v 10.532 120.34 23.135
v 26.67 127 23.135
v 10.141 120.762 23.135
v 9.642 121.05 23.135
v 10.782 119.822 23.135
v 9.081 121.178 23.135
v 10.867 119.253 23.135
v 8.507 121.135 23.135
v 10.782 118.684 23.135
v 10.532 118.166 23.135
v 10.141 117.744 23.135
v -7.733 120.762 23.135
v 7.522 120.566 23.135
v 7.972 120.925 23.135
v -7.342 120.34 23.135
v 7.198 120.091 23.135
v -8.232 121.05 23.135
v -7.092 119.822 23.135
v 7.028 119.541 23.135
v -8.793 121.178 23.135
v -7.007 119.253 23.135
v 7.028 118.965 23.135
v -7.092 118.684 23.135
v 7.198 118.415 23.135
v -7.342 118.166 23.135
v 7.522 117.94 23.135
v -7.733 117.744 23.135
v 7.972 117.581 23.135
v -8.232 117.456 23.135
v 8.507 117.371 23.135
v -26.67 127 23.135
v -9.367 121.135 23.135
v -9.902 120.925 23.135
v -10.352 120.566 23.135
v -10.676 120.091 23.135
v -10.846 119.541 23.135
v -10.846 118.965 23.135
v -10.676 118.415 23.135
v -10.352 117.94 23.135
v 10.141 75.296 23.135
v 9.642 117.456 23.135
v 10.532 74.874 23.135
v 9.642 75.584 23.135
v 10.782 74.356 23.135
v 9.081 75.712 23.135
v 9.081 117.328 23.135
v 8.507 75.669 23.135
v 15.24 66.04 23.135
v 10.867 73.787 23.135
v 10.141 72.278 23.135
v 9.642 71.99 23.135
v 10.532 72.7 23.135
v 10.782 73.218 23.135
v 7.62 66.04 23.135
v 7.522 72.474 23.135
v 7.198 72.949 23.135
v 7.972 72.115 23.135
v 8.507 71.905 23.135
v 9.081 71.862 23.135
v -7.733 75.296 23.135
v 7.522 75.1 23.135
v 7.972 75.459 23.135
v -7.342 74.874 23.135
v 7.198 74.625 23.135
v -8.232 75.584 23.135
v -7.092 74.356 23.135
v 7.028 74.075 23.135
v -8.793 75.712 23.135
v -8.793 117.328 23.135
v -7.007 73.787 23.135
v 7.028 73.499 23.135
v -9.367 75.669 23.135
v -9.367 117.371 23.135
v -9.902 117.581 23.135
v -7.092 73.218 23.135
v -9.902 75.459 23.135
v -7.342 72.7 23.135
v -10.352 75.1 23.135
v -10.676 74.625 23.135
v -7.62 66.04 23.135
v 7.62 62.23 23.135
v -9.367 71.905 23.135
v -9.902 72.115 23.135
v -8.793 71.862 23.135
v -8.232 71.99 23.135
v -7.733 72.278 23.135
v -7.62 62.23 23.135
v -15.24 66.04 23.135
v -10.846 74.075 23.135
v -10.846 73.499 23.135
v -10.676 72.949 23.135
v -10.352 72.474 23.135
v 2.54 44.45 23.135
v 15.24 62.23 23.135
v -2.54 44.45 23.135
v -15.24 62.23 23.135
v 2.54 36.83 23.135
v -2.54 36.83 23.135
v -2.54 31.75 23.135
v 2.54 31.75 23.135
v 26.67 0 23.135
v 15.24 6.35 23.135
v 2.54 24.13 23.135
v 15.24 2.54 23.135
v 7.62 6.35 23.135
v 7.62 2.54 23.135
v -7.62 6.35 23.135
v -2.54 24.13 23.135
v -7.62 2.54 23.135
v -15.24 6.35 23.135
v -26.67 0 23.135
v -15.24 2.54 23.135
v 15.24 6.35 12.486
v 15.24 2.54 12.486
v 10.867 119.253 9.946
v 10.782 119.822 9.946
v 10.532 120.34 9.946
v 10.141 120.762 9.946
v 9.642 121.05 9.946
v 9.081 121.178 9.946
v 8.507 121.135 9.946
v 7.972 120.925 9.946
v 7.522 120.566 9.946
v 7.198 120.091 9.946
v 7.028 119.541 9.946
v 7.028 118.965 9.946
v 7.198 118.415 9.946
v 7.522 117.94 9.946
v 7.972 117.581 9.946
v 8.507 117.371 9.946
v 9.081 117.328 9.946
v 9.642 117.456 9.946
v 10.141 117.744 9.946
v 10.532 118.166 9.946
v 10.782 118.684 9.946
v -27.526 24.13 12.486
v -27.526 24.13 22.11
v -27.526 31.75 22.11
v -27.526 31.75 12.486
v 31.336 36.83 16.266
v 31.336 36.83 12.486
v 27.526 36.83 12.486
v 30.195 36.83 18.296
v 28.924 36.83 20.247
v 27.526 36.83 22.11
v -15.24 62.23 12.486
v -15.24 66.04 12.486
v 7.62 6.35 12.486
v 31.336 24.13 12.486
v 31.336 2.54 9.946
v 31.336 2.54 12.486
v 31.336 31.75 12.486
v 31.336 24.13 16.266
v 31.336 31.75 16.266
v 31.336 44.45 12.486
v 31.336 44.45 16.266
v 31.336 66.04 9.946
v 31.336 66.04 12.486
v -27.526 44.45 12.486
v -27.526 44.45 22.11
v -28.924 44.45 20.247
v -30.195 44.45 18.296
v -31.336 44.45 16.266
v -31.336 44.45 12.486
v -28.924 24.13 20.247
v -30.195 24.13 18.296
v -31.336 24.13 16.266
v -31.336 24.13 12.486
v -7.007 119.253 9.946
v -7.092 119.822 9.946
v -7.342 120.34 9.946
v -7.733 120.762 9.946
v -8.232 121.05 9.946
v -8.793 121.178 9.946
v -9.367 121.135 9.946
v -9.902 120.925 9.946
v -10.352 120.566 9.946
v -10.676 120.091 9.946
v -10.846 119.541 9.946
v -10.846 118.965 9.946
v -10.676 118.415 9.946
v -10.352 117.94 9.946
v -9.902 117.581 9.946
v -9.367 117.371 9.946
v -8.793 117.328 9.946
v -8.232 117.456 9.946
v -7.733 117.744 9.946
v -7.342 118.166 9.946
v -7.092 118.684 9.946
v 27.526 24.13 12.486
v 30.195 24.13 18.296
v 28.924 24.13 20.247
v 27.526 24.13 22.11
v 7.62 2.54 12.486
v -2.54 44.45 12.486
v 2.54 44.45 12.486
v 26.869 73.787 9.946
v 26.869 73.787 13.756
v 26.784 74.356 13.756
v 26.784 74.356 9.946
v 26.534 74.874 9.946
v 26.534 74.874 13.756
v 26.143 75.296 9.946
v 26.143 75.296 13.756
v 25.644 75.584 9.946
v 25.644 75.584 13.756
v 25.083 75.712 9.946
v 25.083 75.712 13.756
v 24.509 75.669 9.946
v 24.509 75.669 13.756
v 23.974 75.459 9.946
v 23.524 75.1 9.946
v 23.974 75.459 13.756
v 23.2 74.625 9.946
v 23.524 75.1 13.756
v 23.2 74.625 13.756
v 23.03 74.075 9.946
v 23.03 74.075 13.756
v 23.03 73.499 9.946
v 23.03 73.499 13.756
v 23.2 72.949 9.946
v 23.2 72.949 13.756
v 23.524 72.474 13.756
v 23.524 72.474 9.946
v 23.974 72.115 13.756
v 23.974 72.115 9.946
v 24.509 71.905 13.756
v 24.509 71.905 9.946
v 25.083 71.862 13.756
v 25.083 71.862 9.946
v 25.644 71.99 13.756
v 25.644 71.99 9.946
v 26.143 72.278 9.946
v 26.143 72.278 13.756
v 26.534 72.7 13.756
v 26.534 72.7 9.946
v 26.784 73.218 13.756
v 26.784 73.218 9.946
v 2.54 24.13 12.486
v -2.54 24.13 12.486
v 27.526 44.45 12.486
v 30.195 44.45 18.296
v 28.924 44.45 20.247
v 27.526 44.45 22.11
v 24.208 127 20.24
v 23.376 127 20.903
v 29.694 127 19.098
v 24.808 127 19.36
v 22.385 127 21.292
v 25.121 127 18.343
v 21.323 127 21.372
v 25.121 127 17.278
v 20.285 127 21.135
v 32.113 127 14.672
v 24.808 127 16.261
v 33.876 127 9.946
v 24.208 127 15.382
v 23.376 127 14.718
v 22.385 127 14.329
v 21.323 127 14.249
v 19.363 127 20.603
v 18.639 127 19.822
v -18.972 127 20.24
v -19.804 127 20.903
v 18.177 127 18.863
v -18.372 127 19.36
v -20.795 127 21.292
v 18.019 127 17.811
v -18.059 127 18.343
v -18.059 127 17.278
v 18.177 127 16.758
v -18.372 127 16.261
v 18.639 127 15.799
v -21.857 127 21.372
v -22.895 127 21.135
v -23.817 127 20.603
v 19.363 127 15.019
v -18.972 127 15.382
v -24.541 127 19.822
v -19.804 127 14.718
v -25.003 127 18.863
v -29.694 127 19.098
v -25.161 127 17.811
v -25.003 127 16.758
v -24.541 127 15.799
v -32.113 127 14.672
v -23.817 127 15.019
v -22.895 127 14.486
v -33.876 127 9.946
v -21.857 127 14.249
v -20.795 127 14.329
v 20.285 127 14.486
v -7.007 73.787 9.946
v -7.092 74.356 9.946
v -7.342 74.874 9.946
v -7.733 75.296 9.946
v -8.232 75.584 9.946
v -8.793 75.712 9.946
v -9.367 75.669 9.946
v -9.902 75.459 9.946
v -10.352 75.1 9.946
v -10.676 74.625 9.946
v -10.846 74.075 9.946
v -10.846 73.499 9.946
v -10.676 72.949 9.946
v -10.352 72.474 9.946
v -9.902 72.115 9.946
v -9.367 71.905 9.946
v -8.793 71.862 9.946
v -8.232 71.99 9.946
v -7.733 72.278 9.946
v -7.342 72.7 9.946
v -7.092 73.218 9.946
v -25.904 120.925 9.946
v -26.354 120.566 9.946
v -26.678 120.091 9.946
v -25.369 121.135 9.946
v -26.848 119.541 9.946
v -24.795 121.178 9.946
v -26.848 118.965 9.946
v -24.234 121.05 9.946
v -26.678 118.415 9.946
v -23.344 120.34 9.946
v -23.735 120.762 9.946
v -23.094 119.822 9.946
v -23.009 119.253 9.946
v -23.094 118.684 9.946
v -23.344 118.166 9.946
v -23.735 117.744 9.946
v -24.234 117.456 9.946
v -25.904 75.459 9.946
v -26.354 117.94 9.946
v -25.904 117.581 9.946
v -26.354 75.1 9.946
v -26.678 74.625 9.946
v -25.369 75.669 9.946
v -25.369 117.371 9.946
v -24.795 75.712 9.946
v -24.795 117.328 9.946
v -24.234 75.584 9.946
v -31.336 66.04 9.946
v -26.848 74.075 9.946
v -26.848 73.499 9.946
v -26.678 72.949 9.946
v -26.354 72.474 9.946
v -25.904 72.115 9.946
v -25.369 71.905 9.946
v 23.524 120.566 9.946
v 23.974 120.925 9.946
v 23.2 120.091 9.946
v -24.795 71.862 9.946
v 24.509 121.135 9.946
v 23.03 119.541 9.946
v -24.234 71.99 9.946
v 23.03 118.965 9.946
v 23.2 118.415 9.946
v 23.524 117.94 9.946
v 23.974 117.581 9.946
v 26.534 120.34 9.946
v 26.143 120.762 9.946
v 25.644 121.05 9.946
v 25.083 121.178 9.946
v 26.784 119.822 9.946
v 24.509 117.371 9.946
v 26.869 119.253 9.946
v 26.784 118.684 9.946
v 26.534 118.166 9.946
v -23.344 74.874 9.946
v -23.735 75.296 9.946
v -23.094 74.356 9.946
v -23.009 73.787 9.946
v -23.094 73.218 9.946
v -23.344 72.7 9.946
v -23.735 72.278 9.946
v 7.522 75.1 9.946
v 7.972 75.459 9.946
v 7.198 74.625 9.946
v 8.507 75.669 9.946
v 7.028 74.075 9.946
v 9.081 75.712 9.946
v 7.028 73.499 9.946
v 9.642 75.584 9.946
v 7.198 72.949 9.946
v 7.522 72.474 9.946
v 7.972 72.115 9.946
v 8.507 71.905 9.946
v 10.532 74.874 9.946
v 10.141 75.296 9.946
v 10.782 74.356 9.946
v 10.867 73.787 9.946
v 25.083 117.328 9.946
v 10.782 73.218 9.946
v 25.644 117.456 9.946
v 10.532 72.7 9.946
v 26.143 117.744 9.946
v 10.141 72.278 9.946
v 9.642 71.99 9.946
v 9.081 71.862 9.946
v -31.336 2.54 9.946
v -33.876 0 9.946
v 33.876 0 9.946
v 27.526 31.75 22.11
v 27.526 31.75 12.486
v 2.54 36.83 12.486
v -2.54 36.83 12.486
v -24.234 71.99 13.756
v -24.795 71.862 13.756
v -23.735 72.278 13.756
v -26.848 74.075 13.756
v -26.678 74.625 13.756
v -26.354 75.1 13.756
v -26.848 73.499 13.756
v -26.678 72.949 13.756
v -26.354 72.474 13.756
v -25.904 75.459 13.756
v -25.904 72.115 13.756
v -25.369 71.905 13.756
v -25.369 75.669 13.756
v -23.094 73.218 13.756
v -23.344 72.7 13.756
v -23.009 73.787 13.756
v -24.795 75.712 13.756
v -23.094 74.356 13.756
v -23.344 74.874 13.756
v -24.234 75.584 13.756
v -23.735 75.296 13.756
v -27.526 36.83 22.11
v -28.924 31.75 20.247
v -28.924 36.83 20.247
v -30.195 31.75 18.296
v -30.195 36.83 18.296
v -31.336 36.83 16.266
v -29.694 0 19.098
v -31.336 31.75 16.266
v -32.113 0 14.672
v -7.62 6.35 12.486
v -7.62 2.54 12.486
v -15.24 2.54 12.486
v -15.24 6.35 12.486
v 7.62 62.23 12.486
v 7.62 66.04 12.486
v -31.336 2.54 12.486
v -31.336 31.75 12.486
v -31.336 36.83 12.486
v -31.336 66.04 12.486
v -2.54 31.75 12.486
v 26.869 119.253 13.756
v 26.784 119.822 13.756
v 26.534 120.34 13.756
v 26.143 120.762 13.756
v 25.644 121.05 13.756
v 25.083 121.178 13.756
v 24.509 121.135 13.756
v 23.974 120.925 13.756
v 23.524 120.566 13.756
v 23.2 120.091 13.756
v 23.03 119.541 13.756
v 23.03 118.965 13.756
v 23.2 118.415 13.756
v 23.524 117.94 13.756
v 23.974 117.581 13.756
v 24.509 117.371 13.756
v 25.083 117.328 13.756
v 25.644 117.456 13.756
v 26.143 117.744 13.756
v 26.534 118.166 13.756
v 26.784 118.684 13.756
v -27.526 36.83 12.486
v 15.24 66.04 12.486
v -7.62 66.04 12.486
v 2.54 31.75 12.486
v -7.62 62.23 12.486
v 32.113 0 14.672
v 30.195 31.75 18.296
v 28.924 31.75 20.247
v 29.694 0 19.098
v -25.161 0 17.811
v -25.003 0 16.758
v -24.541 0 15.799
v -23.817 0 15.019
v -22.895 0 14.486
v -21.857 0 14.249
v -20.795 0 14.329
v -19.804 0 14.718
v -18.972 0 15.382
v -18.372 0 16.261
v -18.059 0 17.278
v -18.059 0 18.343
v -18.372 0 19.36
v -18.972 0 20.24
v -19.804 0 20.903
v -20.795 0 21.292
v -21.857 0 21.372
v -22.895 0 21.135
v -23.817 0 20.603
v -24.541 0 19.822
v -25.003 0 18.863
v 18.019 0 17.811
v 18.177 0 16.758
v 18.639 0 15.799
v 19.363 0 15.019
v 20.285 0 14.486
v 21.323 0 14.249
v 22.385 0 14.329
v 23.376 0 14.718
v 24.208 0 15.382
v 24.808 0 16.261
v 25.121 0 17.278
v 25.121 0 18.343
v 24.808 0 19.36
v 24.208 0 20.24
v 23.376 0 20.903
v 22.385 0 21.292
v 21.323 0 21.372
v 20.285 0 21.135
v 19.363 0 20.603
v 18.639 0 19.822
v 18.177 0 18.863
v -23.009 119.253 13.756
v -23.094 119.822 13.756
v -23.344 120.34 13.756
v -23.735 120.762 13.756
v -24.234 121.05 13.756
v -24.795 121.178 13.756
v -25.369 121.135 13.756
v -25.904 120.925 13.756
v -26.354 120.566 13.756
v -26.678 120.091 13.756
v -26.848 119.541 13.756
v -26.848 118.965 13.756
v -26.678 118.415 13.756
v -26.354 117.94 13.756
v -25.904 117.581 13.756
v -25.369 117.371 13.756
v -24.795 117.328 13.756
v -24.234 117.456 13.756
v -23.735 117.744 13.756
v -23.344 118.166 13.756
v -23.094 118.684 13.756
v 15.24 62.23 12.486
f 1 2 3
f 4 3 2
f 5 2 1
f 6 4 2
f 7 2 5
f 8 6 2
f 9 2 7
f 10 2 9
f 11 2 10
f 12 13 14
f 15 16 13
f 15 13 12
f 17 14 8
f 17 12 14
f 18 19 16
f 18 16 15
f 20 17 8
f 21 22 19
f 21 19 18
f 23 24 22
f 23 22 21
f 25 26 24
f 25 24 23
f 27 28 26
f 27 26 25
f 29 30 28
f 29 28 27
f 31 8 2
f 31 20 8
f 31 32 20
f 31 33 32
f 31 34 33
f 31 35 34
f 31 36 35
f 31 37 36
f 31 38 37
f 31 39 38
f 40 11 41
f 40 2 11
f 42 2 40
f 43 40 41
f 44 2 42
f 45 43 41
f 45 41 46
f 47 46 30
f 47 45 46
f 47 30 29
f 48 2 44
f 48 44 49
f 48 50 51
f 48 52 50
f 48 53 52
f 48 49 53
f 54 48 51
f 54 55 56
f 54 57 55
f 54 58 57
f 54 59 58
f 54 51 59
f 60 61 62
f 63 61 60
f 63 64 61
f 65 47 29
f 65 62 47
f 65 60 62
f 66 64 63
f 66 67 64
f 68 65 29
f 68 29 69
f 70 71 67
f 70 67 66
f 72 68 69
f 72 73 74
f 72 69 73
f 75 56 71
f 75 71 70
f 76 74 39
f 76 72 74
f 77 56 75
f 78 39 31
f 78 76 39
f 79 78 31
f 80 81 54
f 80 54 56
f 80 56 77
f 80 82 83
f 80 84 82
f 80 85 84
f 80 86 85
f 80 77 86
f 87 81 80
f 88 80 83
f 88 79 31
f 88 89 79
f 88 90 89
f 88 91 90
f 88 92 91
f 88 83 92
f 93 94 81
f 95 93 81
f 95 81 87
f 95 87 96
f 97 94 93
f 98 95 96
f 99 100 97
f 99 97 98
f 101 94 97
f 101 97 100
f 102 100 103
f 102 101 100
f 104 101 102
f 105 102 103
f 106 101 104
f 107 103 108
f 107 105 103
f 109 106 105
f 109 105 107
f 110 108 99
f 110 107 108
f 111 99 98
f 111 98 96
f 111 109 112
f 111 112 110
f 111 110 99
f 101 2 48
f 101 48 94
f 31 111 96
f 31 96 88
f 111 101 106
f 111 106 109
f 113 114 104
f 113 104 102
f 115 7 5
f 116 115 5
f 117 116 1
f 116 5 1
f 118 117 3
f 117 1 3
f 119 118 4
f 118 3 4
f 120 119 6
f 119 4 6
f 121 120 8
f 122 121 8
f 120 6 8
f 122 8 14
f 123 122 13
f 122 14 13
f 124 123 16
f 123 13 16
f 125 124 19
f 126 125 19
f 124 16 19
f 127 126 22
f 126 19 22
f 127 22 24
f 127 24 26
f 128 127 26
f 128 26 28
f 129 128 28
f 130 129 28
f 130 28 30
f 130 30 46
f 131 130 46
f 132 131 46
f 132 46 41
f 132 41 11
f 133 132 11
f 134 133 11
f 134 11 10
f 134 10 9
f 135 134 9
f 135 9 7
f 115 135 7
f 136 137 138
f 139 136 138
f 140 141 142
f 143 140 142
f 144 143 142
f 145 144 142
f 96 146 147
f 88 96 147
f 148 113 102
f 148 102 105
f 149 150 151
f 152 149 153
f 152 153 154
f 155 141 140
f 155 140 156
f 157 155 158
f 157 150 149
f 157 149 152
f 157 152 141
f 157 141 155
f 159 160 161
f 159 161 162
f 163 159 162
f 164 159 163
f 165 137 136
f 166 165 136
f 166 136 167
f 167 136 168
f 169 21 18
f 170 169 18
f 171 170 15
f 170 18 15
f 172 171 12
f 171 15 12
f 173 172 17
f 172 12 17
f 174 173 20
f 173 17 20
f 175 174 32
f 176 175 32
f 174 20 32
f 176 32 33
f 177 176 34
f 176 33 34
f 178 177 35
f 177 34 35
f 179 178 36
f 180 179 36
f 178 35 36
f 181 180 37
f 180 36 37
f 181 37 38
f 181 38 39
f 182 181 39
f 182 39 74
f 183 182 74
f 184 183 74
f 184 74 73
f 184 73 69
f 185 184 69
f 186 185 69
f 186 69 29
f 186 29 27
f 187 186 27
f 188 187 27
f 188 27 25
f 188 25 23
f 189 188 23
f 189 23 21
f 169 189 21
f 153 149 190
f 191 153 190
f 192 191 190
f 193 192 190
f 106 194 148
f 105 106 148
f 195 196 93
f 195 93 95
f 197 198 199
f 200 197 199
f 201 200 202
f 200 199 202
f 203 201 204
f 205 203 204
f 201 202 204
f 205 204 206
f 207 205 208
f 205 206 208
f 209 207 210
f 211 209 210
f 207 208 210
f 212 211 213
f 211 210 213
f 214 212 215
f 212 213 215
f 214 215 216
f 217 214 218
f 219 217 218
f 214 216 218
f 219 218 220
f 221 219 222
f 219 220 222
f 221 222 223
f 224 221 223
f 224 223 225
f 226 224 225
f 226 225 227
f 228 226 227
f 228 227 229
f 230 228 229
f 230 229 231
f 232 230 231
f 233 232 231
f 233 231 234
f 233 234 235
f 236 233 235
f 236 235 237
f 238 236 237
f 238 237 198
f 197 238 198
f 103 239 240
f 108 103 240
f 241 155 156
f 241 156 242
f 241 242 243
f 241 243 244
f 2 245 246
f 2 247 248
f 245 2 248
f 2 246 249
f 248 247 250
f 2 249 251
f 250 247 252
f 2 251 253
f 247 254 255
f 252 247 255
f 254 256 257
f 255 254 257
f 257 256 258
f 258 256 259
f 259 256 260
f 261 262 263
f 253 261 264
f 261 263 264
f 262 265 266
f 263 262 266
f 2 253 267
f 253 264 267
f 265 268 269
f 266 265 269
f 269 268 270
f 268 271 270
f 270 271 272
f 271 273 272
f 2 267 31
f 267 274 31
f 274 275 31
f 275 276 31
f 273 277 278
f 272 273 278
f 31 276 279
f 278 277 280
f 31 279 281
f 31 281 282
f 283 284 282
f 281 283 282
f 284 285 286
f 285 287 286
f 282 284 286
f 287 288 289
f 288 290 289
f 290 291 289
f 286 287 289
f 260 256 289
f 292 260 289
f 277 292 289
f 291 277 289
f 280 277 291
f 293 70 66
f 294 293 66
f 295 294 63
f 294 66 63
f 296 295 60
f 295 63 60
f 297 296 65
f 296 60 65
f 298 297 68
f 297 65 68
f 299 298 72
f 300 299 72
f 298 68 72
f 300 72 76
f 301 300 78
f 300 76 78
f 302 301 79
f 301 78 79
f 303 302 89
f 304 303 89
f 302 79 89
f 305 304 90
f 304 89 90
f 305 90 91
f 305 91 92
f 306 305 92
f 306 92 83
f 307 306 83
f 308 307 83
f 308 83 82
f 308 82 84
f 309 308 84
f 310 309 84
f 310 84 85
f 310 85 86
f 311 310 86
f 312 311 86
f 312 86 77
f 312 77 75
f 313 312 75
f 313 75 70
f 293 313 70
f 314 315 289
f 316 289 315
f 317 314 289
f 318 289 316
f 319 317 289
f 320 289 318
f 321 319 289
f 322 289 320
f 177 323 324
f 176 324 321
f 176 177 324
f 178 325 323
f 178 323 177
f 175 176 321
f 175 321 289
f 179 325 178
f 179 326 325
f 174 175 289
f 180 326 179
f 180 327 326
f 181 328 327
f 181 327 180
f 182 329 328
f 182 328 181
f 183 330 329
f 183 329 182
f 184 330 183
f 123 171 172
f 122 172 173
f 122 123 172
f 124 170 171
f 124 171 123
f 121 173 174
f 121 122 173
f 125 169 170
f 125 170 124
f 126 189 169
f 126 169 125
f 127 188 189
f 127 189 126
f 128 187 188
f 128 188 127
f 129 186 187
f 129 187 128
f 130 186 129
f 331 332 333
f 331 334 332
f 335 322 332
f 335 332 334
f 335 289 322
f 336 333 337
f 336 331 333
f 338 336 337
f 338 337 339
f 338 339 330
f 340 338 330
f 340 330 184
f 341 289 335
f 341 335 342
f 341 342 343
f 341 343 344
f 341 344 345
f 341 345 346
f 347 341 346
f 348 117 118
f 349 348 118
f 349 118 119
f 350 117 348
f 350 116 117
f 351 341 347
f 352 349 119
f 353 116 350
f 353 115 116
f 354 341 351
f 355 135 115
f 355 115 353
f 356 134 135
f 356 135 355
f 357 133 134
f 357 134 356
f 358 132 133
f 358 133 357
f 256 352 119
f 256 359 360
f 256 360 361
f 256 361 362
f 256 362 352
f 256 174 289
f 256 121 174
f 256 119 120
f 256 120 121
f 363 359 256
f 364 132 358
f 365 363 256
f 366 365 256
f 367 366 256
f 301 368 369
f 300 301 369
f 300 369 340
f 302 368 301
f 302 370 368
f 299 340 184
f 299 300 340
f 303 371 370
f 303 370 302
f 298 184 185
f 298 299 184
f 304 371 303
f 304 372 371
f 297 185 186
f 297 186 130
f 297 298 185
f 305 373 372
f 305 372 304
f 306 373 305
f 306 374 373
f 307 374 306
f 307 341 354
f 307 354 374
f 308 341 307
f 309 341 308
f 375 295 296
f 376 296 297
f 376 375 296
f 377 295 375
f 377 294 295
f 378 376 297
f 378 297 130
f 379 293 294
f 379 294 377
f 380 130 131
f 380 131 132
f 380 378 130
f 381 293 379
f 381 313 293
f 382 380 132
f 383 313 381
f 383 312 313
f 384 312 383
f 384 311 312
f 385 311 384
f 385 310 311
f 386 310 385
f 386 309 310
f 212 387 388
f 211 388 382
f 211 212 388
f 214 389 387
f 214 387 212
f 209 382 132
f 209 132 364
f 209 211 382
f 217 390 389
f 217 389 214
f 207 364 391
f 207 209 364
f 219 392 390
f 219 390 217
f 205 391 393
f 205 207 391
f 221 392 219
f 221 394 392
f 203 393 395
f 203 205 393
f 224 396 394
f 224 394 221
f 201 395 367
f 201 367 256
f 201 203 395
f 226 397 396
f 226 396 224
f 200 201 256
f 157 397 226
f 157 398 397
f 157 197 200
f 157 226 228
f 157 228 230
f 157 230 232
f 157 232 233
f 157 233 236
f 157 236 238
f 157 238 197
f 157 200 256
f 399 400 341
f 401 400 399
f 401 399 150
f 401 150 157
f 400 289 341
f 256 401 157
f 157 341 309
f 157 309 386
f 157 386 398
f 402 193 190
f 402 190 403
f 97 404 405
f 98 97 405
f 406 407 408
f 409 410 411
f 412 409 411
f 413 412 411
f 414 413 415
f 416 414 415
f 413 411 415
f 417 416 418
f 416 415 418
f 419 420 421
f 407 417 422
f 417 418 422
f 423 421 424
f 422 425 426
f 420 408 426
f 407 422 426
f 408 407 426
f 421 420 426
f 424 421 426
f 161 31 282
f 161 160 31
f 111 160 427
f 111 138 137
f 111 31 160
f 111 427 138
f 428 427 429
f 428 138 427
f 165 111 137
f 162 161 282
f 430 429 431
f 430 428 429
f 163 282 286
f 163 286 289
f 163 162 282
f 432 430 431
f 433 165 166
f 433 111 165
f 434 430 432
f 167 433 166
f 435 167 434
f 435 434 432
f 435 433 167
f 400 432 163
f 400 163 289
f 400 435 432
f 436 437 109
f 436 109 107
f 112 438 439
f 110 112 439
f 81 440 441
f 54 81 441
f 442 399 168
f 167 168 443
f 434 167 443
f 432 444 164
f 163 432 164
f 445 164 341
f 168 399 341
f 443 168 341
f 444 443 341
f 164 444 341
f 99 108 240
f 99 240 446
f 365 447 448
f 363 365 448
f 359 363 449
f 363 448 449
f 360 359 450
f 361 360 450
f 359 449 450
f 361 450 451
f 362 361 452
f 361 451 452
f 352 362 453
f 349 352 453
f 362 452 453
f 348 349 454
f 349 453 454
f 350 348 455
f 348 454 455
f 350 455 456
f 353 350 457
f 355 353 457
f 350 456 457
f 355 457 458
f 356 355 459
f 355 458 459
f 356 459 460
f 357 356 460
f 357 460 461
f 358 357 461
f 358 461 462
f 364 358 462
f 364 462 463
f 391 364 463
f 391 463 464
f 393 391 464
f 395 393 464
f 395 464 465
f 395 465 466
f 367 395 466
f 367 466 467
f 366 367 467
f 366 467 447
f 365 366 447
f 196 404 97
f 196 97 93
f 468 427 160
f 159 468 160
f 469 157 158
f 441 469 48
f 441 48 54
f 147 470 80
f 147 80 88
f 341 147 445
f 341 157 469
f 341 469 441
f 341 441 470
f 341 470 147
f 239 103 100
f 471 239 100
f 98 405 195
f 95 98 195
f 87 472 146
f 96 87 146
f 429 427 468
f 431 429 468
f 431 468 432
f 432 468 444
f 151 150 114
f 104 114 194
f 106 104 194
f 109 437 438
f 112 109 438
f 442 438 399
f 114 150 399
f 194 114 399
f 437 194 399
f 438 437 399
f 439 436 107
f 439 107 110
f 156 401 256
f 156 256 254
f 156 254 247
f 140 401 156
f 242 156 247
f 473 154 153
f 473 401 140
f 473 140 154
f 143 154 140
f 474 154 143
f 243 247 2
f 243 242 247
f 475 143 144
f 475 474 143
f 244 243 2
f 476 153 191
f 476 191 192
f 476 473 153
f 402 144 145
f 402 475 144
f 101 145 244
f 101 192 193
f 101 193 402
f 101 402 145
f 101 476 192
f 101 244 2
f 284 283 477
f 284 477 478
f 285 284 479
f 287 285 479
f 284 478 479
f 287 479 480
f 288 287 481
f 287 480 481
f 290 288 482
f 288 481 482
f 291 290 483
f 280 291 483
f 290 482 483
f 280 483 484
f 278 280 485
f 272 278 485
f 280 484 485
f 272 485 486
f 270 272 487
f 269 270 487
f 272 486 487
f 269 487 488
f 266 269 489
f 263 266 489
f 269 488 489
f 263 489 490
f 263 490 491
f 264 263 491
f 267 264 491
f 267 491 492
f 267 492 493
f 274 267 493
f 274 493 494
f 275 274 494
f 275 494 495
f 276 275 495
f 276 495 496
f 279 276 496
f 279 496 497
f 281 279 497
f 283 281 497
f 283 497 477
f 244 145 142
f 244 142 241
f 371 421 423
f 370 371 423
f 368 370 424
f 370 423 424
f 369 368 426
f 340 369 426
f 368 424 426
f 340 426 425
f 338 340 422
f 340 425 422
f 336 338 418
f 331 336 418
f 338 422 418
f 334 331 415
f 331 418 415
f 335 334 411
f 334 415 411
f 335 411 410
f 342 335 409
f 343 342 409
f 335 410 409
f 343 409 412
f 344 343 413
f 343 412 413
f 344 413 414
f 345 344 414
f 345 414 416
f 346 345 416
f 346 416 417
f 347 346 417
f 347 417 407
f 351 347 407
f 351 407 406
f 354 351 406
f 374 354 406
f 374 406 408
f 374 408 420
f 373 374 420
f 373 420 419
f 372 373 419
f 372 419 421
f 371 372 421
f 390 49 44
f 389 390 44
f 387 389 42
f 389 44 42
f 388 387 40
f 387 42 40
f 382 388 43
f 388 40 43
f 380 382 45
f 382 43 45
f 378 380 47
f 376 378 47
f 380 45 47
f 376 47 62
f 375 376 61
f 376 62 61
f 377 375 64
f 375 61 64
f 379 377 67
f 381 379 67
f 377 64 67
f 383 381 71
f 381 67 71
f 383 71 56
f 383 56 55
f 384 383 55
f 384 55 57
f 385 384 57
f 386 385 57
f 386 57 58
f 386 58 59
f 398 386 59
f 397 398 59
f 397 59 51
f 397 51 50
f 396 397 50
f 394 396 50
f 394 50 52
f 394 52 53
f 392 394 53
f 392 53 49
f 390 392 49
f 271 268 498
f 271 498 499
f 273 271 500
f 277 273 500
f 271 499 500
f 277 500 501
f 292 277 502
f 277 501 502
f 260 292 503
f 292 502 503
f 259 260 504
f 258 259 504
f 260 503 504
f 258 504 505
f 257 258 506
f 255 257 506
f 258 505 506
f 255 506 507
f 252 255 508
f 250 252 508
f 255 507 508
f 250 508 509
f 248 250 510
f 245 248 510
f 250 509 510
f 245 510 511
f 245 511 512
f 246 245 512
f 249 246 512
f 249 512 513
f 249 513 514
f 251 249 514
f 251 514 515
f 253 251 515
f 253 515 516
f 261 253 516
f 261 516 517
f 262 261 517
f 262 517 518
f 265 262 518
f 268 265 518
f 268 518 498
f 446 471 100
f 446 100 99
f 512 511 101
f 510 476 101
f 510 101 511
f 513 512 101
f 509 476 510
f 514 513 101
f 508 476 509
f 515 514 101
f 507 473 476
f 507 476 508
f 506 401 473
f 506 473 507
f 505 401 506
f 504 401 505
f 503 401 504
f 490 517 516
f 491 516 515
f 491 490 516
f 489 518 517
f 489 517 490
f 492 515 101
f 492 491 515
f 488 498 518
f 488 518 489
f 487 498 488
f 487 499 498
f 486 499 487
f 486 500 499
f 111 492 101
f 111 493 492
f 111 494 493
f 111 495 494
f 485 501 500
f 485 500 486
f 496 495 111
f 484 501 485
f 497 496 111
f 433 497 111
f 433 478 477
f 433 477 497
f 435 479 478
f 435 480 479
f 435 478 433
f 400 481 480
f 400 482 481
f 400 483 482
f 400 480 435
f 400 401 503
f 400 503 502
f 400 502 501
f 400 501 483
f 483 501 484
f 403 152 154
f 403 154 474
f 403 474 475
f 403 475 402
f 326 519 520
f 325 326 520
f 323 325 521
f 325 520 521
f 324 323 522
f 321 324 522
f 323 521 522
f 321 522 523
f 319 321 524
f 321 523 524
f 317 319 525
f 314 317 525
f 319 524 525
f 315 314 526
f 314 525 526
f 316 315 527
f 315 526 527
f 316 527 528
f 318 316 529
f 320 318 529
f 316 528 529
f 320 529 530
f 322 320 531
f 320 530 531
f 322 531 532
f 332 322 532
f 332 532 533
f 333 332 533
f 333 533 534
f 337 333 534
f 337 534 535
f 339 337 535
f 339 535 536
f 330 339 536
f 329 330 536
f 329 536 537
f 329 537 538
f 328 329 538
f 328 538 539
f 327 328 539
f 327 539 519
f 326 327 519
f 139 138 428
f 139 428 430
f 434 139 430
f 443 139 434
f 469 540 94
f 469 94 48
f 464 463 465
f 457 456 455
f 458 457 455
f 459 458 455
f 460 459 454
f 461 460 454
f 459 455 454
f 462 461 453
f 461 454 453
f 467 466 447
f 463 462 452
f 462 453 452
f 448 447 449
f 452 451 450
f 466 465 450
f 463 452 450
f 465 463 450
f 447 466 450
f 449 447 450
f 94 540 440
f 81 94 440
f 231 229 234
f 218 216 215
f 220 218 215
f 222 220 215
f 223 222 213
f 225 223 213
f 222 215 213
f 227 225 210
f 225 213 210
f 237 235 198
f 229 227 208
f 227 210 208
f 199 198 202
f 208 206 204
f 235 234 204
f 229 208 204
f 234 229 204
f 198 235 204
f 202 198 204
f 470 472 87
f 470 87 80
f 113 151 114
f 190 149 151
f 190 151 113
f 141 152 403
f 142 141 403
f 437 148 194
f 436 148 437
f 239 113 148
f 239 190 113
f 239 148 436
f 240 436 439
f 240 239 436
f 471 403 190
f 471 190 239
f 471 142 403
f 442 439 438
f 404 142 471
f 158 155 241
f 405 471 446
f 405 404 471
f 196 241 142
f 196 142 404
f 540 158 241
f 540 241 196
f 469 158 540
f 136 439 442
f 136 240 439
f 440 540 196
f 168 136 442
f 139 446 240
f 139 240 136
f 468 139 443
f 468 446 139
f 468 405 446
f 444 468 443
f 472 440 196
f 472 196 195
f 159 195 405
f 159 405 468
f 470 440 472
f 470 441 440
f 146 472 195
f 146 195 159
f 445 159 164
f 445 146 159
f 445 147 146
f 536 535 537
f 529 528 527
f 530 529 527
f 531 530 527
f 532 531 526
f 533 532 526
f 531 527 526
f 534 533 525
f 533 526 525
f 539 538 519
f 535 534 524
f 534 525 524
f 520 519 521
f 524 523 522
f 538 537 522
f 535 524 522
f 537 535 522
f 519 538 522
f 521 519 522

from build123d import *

# Parameters (mm, degrees)
BOSS_EXTRUDE1_DEPTH       = 127
SKETCH10_W                = 62.671930198
SKETCH10_H                = 63.5
CUT_EXTRUDE1_DEPTH        = 2.54
F_1_4_CLEARANCE_HOLE1_D   = 7.14248
F_8_CLEARANCE_HOLE1_D     = 3.8608
SKETCH19_W                = 5.08
SKETCH19_H                = 7.62
SKETCH19_W_2              = 3.81
SKETCH19_W_3              = 7.62
SKETCH19_H_2              = 3.81
CUT_EXTRUDE3_DEPTH        = 14.188436542
F_8_CLEARANCE_HOLE2_D     = 3.8608
F_8_CLEARANCE_HOLE2_DEPTH = 3.81


with BuildPart() as part:
    # Sketch1 → Boss-Extrude1 (new body)
    with BuildSketch(Plane(origin=(0, 0, 0), x_dir=(1, 0, 0), z_dir=(0, 1, 0))):
        with BuildLine():
            Line((-33.875965099, -9.946488053), (33.875965099, -9.946488053))
            ThreePointArc((33.875965099, -9.946488053), (30.982853114, -16.928569016), (26.67, -23.134924595))
            Line((26.67, -23.134924595), (-26.67, -23.134924595))
            ThreePointArc((-26.67, -23.134924595), (-30.982853114, -16.928569016), (-33.875965099, -9.946488053))
        make_face()
    extrude(amount=BOSS_EXTRUDE1_DEPTH)

    # Sketch10 → Cut-Extrude1 (cut)
    with BuildSketch(Plane(origin=(0, 0, 9.946488053), x_dir=(-1, 0, 0), z_dir=(0, 0, -1))):
        with Locations((0, 34.29)):
            Rectangle(SKETCH10_W, SKETCH10_H)
    extrude(amount=-CUT_EXTRUDE1_DEPTH, mode=Mode.SUBTRACT)

    # 1/4 Clearance Hole1 (through all)
    with Locations(Plane(origin=(0, 127, 0), x_dir=(1, 0, 0), z_dir=(0, 1, 0))):
        with Locations((-21.59, -17.810706324), (21.59, -17.810706324)):
            Hole(F_1_4_CLEARANCE_HOLE1_D / 2)

    # #8 Clearance Hole1 (through all)
    with Locations(Plane(origin=(0, 0, 9.946488053), x_dir=(-1, 0, 0), z_dir=(0, 0, -1))):
        with Locations((-8.93698255, 119.253), (-8.93698255, 73.787), (8.93698255, 73.787), (8.93698255, 119.253)):
            Hole(F_8_CLEARANCE_HOLE1_D / 2)

    # Sketch19 → Cut-Extrude3 (cut, through all)
    with BuildSketch(Plane(origin=(0, 0, 9.946488053), x_dir=(-1, 0, 0), z_dir=(0, 0, -1))):
        with Locations((0, 40.64)):
            Rectangle(SKETCH19_W, SKETCH19_H)
        with Locations((0, 27.94)):
            Rectangle(SKETCH19_W, SKETCH19_H)
        with Locations((29.430965099, 40.64)):
            Rectangle(SKETCH19_W_2, SKETCH19_H)
        with Locations((-11.43, 64.135)):
            Rectangle(SKETCH19_W_3, SKETCH19_H_2)
        with Locations((11.43, 64.135)):
            Rectangle(SKETCH19_W_3, SKETCH19_H_2)
        with Locations((-11.43, 4.445)):
            Rectangle(SKETCH19_W_3, SKETCH19_H_2)
        with Locations((11.43, 4.445)):
            Rectangle(SKETCH19_W_3, SKETCH19_H_2)
        with Locations((-29.430965099, 40.64)):
            Rectangle(SKETCH19_W_2, SKETCH19_H)
        with Locations((29.430965099, 27.94)):
            Rectangle(SKETCH19_W_2, SKETCH19_H)
        with Locations((-29.430965099, 27.94)):
            Rectangle(SKETCH19_W_2, SKETCH19_H)
    extrude(amount=-CUT_EXTRUDE3_DEPTH, mode=Mode.SUBTRACT)

    # #8 Clearance Hole2
    with Locations(Plane(origin=(0, 0, 9.946488053), x_dir=(-1, 0, 0), z_dir=(0, 0, -1))):
        with Locations((-24.93898255, 119.253), (-24.93898255, 73.787), (24.93898255, 73.787), (24.93898255, 119.253)):
            Hole(F_8_CLEARANCE_HOLE2_D / 2, depth=F_8_CLEARANCE_HOLE2_DEPTH)


solid = part.part
